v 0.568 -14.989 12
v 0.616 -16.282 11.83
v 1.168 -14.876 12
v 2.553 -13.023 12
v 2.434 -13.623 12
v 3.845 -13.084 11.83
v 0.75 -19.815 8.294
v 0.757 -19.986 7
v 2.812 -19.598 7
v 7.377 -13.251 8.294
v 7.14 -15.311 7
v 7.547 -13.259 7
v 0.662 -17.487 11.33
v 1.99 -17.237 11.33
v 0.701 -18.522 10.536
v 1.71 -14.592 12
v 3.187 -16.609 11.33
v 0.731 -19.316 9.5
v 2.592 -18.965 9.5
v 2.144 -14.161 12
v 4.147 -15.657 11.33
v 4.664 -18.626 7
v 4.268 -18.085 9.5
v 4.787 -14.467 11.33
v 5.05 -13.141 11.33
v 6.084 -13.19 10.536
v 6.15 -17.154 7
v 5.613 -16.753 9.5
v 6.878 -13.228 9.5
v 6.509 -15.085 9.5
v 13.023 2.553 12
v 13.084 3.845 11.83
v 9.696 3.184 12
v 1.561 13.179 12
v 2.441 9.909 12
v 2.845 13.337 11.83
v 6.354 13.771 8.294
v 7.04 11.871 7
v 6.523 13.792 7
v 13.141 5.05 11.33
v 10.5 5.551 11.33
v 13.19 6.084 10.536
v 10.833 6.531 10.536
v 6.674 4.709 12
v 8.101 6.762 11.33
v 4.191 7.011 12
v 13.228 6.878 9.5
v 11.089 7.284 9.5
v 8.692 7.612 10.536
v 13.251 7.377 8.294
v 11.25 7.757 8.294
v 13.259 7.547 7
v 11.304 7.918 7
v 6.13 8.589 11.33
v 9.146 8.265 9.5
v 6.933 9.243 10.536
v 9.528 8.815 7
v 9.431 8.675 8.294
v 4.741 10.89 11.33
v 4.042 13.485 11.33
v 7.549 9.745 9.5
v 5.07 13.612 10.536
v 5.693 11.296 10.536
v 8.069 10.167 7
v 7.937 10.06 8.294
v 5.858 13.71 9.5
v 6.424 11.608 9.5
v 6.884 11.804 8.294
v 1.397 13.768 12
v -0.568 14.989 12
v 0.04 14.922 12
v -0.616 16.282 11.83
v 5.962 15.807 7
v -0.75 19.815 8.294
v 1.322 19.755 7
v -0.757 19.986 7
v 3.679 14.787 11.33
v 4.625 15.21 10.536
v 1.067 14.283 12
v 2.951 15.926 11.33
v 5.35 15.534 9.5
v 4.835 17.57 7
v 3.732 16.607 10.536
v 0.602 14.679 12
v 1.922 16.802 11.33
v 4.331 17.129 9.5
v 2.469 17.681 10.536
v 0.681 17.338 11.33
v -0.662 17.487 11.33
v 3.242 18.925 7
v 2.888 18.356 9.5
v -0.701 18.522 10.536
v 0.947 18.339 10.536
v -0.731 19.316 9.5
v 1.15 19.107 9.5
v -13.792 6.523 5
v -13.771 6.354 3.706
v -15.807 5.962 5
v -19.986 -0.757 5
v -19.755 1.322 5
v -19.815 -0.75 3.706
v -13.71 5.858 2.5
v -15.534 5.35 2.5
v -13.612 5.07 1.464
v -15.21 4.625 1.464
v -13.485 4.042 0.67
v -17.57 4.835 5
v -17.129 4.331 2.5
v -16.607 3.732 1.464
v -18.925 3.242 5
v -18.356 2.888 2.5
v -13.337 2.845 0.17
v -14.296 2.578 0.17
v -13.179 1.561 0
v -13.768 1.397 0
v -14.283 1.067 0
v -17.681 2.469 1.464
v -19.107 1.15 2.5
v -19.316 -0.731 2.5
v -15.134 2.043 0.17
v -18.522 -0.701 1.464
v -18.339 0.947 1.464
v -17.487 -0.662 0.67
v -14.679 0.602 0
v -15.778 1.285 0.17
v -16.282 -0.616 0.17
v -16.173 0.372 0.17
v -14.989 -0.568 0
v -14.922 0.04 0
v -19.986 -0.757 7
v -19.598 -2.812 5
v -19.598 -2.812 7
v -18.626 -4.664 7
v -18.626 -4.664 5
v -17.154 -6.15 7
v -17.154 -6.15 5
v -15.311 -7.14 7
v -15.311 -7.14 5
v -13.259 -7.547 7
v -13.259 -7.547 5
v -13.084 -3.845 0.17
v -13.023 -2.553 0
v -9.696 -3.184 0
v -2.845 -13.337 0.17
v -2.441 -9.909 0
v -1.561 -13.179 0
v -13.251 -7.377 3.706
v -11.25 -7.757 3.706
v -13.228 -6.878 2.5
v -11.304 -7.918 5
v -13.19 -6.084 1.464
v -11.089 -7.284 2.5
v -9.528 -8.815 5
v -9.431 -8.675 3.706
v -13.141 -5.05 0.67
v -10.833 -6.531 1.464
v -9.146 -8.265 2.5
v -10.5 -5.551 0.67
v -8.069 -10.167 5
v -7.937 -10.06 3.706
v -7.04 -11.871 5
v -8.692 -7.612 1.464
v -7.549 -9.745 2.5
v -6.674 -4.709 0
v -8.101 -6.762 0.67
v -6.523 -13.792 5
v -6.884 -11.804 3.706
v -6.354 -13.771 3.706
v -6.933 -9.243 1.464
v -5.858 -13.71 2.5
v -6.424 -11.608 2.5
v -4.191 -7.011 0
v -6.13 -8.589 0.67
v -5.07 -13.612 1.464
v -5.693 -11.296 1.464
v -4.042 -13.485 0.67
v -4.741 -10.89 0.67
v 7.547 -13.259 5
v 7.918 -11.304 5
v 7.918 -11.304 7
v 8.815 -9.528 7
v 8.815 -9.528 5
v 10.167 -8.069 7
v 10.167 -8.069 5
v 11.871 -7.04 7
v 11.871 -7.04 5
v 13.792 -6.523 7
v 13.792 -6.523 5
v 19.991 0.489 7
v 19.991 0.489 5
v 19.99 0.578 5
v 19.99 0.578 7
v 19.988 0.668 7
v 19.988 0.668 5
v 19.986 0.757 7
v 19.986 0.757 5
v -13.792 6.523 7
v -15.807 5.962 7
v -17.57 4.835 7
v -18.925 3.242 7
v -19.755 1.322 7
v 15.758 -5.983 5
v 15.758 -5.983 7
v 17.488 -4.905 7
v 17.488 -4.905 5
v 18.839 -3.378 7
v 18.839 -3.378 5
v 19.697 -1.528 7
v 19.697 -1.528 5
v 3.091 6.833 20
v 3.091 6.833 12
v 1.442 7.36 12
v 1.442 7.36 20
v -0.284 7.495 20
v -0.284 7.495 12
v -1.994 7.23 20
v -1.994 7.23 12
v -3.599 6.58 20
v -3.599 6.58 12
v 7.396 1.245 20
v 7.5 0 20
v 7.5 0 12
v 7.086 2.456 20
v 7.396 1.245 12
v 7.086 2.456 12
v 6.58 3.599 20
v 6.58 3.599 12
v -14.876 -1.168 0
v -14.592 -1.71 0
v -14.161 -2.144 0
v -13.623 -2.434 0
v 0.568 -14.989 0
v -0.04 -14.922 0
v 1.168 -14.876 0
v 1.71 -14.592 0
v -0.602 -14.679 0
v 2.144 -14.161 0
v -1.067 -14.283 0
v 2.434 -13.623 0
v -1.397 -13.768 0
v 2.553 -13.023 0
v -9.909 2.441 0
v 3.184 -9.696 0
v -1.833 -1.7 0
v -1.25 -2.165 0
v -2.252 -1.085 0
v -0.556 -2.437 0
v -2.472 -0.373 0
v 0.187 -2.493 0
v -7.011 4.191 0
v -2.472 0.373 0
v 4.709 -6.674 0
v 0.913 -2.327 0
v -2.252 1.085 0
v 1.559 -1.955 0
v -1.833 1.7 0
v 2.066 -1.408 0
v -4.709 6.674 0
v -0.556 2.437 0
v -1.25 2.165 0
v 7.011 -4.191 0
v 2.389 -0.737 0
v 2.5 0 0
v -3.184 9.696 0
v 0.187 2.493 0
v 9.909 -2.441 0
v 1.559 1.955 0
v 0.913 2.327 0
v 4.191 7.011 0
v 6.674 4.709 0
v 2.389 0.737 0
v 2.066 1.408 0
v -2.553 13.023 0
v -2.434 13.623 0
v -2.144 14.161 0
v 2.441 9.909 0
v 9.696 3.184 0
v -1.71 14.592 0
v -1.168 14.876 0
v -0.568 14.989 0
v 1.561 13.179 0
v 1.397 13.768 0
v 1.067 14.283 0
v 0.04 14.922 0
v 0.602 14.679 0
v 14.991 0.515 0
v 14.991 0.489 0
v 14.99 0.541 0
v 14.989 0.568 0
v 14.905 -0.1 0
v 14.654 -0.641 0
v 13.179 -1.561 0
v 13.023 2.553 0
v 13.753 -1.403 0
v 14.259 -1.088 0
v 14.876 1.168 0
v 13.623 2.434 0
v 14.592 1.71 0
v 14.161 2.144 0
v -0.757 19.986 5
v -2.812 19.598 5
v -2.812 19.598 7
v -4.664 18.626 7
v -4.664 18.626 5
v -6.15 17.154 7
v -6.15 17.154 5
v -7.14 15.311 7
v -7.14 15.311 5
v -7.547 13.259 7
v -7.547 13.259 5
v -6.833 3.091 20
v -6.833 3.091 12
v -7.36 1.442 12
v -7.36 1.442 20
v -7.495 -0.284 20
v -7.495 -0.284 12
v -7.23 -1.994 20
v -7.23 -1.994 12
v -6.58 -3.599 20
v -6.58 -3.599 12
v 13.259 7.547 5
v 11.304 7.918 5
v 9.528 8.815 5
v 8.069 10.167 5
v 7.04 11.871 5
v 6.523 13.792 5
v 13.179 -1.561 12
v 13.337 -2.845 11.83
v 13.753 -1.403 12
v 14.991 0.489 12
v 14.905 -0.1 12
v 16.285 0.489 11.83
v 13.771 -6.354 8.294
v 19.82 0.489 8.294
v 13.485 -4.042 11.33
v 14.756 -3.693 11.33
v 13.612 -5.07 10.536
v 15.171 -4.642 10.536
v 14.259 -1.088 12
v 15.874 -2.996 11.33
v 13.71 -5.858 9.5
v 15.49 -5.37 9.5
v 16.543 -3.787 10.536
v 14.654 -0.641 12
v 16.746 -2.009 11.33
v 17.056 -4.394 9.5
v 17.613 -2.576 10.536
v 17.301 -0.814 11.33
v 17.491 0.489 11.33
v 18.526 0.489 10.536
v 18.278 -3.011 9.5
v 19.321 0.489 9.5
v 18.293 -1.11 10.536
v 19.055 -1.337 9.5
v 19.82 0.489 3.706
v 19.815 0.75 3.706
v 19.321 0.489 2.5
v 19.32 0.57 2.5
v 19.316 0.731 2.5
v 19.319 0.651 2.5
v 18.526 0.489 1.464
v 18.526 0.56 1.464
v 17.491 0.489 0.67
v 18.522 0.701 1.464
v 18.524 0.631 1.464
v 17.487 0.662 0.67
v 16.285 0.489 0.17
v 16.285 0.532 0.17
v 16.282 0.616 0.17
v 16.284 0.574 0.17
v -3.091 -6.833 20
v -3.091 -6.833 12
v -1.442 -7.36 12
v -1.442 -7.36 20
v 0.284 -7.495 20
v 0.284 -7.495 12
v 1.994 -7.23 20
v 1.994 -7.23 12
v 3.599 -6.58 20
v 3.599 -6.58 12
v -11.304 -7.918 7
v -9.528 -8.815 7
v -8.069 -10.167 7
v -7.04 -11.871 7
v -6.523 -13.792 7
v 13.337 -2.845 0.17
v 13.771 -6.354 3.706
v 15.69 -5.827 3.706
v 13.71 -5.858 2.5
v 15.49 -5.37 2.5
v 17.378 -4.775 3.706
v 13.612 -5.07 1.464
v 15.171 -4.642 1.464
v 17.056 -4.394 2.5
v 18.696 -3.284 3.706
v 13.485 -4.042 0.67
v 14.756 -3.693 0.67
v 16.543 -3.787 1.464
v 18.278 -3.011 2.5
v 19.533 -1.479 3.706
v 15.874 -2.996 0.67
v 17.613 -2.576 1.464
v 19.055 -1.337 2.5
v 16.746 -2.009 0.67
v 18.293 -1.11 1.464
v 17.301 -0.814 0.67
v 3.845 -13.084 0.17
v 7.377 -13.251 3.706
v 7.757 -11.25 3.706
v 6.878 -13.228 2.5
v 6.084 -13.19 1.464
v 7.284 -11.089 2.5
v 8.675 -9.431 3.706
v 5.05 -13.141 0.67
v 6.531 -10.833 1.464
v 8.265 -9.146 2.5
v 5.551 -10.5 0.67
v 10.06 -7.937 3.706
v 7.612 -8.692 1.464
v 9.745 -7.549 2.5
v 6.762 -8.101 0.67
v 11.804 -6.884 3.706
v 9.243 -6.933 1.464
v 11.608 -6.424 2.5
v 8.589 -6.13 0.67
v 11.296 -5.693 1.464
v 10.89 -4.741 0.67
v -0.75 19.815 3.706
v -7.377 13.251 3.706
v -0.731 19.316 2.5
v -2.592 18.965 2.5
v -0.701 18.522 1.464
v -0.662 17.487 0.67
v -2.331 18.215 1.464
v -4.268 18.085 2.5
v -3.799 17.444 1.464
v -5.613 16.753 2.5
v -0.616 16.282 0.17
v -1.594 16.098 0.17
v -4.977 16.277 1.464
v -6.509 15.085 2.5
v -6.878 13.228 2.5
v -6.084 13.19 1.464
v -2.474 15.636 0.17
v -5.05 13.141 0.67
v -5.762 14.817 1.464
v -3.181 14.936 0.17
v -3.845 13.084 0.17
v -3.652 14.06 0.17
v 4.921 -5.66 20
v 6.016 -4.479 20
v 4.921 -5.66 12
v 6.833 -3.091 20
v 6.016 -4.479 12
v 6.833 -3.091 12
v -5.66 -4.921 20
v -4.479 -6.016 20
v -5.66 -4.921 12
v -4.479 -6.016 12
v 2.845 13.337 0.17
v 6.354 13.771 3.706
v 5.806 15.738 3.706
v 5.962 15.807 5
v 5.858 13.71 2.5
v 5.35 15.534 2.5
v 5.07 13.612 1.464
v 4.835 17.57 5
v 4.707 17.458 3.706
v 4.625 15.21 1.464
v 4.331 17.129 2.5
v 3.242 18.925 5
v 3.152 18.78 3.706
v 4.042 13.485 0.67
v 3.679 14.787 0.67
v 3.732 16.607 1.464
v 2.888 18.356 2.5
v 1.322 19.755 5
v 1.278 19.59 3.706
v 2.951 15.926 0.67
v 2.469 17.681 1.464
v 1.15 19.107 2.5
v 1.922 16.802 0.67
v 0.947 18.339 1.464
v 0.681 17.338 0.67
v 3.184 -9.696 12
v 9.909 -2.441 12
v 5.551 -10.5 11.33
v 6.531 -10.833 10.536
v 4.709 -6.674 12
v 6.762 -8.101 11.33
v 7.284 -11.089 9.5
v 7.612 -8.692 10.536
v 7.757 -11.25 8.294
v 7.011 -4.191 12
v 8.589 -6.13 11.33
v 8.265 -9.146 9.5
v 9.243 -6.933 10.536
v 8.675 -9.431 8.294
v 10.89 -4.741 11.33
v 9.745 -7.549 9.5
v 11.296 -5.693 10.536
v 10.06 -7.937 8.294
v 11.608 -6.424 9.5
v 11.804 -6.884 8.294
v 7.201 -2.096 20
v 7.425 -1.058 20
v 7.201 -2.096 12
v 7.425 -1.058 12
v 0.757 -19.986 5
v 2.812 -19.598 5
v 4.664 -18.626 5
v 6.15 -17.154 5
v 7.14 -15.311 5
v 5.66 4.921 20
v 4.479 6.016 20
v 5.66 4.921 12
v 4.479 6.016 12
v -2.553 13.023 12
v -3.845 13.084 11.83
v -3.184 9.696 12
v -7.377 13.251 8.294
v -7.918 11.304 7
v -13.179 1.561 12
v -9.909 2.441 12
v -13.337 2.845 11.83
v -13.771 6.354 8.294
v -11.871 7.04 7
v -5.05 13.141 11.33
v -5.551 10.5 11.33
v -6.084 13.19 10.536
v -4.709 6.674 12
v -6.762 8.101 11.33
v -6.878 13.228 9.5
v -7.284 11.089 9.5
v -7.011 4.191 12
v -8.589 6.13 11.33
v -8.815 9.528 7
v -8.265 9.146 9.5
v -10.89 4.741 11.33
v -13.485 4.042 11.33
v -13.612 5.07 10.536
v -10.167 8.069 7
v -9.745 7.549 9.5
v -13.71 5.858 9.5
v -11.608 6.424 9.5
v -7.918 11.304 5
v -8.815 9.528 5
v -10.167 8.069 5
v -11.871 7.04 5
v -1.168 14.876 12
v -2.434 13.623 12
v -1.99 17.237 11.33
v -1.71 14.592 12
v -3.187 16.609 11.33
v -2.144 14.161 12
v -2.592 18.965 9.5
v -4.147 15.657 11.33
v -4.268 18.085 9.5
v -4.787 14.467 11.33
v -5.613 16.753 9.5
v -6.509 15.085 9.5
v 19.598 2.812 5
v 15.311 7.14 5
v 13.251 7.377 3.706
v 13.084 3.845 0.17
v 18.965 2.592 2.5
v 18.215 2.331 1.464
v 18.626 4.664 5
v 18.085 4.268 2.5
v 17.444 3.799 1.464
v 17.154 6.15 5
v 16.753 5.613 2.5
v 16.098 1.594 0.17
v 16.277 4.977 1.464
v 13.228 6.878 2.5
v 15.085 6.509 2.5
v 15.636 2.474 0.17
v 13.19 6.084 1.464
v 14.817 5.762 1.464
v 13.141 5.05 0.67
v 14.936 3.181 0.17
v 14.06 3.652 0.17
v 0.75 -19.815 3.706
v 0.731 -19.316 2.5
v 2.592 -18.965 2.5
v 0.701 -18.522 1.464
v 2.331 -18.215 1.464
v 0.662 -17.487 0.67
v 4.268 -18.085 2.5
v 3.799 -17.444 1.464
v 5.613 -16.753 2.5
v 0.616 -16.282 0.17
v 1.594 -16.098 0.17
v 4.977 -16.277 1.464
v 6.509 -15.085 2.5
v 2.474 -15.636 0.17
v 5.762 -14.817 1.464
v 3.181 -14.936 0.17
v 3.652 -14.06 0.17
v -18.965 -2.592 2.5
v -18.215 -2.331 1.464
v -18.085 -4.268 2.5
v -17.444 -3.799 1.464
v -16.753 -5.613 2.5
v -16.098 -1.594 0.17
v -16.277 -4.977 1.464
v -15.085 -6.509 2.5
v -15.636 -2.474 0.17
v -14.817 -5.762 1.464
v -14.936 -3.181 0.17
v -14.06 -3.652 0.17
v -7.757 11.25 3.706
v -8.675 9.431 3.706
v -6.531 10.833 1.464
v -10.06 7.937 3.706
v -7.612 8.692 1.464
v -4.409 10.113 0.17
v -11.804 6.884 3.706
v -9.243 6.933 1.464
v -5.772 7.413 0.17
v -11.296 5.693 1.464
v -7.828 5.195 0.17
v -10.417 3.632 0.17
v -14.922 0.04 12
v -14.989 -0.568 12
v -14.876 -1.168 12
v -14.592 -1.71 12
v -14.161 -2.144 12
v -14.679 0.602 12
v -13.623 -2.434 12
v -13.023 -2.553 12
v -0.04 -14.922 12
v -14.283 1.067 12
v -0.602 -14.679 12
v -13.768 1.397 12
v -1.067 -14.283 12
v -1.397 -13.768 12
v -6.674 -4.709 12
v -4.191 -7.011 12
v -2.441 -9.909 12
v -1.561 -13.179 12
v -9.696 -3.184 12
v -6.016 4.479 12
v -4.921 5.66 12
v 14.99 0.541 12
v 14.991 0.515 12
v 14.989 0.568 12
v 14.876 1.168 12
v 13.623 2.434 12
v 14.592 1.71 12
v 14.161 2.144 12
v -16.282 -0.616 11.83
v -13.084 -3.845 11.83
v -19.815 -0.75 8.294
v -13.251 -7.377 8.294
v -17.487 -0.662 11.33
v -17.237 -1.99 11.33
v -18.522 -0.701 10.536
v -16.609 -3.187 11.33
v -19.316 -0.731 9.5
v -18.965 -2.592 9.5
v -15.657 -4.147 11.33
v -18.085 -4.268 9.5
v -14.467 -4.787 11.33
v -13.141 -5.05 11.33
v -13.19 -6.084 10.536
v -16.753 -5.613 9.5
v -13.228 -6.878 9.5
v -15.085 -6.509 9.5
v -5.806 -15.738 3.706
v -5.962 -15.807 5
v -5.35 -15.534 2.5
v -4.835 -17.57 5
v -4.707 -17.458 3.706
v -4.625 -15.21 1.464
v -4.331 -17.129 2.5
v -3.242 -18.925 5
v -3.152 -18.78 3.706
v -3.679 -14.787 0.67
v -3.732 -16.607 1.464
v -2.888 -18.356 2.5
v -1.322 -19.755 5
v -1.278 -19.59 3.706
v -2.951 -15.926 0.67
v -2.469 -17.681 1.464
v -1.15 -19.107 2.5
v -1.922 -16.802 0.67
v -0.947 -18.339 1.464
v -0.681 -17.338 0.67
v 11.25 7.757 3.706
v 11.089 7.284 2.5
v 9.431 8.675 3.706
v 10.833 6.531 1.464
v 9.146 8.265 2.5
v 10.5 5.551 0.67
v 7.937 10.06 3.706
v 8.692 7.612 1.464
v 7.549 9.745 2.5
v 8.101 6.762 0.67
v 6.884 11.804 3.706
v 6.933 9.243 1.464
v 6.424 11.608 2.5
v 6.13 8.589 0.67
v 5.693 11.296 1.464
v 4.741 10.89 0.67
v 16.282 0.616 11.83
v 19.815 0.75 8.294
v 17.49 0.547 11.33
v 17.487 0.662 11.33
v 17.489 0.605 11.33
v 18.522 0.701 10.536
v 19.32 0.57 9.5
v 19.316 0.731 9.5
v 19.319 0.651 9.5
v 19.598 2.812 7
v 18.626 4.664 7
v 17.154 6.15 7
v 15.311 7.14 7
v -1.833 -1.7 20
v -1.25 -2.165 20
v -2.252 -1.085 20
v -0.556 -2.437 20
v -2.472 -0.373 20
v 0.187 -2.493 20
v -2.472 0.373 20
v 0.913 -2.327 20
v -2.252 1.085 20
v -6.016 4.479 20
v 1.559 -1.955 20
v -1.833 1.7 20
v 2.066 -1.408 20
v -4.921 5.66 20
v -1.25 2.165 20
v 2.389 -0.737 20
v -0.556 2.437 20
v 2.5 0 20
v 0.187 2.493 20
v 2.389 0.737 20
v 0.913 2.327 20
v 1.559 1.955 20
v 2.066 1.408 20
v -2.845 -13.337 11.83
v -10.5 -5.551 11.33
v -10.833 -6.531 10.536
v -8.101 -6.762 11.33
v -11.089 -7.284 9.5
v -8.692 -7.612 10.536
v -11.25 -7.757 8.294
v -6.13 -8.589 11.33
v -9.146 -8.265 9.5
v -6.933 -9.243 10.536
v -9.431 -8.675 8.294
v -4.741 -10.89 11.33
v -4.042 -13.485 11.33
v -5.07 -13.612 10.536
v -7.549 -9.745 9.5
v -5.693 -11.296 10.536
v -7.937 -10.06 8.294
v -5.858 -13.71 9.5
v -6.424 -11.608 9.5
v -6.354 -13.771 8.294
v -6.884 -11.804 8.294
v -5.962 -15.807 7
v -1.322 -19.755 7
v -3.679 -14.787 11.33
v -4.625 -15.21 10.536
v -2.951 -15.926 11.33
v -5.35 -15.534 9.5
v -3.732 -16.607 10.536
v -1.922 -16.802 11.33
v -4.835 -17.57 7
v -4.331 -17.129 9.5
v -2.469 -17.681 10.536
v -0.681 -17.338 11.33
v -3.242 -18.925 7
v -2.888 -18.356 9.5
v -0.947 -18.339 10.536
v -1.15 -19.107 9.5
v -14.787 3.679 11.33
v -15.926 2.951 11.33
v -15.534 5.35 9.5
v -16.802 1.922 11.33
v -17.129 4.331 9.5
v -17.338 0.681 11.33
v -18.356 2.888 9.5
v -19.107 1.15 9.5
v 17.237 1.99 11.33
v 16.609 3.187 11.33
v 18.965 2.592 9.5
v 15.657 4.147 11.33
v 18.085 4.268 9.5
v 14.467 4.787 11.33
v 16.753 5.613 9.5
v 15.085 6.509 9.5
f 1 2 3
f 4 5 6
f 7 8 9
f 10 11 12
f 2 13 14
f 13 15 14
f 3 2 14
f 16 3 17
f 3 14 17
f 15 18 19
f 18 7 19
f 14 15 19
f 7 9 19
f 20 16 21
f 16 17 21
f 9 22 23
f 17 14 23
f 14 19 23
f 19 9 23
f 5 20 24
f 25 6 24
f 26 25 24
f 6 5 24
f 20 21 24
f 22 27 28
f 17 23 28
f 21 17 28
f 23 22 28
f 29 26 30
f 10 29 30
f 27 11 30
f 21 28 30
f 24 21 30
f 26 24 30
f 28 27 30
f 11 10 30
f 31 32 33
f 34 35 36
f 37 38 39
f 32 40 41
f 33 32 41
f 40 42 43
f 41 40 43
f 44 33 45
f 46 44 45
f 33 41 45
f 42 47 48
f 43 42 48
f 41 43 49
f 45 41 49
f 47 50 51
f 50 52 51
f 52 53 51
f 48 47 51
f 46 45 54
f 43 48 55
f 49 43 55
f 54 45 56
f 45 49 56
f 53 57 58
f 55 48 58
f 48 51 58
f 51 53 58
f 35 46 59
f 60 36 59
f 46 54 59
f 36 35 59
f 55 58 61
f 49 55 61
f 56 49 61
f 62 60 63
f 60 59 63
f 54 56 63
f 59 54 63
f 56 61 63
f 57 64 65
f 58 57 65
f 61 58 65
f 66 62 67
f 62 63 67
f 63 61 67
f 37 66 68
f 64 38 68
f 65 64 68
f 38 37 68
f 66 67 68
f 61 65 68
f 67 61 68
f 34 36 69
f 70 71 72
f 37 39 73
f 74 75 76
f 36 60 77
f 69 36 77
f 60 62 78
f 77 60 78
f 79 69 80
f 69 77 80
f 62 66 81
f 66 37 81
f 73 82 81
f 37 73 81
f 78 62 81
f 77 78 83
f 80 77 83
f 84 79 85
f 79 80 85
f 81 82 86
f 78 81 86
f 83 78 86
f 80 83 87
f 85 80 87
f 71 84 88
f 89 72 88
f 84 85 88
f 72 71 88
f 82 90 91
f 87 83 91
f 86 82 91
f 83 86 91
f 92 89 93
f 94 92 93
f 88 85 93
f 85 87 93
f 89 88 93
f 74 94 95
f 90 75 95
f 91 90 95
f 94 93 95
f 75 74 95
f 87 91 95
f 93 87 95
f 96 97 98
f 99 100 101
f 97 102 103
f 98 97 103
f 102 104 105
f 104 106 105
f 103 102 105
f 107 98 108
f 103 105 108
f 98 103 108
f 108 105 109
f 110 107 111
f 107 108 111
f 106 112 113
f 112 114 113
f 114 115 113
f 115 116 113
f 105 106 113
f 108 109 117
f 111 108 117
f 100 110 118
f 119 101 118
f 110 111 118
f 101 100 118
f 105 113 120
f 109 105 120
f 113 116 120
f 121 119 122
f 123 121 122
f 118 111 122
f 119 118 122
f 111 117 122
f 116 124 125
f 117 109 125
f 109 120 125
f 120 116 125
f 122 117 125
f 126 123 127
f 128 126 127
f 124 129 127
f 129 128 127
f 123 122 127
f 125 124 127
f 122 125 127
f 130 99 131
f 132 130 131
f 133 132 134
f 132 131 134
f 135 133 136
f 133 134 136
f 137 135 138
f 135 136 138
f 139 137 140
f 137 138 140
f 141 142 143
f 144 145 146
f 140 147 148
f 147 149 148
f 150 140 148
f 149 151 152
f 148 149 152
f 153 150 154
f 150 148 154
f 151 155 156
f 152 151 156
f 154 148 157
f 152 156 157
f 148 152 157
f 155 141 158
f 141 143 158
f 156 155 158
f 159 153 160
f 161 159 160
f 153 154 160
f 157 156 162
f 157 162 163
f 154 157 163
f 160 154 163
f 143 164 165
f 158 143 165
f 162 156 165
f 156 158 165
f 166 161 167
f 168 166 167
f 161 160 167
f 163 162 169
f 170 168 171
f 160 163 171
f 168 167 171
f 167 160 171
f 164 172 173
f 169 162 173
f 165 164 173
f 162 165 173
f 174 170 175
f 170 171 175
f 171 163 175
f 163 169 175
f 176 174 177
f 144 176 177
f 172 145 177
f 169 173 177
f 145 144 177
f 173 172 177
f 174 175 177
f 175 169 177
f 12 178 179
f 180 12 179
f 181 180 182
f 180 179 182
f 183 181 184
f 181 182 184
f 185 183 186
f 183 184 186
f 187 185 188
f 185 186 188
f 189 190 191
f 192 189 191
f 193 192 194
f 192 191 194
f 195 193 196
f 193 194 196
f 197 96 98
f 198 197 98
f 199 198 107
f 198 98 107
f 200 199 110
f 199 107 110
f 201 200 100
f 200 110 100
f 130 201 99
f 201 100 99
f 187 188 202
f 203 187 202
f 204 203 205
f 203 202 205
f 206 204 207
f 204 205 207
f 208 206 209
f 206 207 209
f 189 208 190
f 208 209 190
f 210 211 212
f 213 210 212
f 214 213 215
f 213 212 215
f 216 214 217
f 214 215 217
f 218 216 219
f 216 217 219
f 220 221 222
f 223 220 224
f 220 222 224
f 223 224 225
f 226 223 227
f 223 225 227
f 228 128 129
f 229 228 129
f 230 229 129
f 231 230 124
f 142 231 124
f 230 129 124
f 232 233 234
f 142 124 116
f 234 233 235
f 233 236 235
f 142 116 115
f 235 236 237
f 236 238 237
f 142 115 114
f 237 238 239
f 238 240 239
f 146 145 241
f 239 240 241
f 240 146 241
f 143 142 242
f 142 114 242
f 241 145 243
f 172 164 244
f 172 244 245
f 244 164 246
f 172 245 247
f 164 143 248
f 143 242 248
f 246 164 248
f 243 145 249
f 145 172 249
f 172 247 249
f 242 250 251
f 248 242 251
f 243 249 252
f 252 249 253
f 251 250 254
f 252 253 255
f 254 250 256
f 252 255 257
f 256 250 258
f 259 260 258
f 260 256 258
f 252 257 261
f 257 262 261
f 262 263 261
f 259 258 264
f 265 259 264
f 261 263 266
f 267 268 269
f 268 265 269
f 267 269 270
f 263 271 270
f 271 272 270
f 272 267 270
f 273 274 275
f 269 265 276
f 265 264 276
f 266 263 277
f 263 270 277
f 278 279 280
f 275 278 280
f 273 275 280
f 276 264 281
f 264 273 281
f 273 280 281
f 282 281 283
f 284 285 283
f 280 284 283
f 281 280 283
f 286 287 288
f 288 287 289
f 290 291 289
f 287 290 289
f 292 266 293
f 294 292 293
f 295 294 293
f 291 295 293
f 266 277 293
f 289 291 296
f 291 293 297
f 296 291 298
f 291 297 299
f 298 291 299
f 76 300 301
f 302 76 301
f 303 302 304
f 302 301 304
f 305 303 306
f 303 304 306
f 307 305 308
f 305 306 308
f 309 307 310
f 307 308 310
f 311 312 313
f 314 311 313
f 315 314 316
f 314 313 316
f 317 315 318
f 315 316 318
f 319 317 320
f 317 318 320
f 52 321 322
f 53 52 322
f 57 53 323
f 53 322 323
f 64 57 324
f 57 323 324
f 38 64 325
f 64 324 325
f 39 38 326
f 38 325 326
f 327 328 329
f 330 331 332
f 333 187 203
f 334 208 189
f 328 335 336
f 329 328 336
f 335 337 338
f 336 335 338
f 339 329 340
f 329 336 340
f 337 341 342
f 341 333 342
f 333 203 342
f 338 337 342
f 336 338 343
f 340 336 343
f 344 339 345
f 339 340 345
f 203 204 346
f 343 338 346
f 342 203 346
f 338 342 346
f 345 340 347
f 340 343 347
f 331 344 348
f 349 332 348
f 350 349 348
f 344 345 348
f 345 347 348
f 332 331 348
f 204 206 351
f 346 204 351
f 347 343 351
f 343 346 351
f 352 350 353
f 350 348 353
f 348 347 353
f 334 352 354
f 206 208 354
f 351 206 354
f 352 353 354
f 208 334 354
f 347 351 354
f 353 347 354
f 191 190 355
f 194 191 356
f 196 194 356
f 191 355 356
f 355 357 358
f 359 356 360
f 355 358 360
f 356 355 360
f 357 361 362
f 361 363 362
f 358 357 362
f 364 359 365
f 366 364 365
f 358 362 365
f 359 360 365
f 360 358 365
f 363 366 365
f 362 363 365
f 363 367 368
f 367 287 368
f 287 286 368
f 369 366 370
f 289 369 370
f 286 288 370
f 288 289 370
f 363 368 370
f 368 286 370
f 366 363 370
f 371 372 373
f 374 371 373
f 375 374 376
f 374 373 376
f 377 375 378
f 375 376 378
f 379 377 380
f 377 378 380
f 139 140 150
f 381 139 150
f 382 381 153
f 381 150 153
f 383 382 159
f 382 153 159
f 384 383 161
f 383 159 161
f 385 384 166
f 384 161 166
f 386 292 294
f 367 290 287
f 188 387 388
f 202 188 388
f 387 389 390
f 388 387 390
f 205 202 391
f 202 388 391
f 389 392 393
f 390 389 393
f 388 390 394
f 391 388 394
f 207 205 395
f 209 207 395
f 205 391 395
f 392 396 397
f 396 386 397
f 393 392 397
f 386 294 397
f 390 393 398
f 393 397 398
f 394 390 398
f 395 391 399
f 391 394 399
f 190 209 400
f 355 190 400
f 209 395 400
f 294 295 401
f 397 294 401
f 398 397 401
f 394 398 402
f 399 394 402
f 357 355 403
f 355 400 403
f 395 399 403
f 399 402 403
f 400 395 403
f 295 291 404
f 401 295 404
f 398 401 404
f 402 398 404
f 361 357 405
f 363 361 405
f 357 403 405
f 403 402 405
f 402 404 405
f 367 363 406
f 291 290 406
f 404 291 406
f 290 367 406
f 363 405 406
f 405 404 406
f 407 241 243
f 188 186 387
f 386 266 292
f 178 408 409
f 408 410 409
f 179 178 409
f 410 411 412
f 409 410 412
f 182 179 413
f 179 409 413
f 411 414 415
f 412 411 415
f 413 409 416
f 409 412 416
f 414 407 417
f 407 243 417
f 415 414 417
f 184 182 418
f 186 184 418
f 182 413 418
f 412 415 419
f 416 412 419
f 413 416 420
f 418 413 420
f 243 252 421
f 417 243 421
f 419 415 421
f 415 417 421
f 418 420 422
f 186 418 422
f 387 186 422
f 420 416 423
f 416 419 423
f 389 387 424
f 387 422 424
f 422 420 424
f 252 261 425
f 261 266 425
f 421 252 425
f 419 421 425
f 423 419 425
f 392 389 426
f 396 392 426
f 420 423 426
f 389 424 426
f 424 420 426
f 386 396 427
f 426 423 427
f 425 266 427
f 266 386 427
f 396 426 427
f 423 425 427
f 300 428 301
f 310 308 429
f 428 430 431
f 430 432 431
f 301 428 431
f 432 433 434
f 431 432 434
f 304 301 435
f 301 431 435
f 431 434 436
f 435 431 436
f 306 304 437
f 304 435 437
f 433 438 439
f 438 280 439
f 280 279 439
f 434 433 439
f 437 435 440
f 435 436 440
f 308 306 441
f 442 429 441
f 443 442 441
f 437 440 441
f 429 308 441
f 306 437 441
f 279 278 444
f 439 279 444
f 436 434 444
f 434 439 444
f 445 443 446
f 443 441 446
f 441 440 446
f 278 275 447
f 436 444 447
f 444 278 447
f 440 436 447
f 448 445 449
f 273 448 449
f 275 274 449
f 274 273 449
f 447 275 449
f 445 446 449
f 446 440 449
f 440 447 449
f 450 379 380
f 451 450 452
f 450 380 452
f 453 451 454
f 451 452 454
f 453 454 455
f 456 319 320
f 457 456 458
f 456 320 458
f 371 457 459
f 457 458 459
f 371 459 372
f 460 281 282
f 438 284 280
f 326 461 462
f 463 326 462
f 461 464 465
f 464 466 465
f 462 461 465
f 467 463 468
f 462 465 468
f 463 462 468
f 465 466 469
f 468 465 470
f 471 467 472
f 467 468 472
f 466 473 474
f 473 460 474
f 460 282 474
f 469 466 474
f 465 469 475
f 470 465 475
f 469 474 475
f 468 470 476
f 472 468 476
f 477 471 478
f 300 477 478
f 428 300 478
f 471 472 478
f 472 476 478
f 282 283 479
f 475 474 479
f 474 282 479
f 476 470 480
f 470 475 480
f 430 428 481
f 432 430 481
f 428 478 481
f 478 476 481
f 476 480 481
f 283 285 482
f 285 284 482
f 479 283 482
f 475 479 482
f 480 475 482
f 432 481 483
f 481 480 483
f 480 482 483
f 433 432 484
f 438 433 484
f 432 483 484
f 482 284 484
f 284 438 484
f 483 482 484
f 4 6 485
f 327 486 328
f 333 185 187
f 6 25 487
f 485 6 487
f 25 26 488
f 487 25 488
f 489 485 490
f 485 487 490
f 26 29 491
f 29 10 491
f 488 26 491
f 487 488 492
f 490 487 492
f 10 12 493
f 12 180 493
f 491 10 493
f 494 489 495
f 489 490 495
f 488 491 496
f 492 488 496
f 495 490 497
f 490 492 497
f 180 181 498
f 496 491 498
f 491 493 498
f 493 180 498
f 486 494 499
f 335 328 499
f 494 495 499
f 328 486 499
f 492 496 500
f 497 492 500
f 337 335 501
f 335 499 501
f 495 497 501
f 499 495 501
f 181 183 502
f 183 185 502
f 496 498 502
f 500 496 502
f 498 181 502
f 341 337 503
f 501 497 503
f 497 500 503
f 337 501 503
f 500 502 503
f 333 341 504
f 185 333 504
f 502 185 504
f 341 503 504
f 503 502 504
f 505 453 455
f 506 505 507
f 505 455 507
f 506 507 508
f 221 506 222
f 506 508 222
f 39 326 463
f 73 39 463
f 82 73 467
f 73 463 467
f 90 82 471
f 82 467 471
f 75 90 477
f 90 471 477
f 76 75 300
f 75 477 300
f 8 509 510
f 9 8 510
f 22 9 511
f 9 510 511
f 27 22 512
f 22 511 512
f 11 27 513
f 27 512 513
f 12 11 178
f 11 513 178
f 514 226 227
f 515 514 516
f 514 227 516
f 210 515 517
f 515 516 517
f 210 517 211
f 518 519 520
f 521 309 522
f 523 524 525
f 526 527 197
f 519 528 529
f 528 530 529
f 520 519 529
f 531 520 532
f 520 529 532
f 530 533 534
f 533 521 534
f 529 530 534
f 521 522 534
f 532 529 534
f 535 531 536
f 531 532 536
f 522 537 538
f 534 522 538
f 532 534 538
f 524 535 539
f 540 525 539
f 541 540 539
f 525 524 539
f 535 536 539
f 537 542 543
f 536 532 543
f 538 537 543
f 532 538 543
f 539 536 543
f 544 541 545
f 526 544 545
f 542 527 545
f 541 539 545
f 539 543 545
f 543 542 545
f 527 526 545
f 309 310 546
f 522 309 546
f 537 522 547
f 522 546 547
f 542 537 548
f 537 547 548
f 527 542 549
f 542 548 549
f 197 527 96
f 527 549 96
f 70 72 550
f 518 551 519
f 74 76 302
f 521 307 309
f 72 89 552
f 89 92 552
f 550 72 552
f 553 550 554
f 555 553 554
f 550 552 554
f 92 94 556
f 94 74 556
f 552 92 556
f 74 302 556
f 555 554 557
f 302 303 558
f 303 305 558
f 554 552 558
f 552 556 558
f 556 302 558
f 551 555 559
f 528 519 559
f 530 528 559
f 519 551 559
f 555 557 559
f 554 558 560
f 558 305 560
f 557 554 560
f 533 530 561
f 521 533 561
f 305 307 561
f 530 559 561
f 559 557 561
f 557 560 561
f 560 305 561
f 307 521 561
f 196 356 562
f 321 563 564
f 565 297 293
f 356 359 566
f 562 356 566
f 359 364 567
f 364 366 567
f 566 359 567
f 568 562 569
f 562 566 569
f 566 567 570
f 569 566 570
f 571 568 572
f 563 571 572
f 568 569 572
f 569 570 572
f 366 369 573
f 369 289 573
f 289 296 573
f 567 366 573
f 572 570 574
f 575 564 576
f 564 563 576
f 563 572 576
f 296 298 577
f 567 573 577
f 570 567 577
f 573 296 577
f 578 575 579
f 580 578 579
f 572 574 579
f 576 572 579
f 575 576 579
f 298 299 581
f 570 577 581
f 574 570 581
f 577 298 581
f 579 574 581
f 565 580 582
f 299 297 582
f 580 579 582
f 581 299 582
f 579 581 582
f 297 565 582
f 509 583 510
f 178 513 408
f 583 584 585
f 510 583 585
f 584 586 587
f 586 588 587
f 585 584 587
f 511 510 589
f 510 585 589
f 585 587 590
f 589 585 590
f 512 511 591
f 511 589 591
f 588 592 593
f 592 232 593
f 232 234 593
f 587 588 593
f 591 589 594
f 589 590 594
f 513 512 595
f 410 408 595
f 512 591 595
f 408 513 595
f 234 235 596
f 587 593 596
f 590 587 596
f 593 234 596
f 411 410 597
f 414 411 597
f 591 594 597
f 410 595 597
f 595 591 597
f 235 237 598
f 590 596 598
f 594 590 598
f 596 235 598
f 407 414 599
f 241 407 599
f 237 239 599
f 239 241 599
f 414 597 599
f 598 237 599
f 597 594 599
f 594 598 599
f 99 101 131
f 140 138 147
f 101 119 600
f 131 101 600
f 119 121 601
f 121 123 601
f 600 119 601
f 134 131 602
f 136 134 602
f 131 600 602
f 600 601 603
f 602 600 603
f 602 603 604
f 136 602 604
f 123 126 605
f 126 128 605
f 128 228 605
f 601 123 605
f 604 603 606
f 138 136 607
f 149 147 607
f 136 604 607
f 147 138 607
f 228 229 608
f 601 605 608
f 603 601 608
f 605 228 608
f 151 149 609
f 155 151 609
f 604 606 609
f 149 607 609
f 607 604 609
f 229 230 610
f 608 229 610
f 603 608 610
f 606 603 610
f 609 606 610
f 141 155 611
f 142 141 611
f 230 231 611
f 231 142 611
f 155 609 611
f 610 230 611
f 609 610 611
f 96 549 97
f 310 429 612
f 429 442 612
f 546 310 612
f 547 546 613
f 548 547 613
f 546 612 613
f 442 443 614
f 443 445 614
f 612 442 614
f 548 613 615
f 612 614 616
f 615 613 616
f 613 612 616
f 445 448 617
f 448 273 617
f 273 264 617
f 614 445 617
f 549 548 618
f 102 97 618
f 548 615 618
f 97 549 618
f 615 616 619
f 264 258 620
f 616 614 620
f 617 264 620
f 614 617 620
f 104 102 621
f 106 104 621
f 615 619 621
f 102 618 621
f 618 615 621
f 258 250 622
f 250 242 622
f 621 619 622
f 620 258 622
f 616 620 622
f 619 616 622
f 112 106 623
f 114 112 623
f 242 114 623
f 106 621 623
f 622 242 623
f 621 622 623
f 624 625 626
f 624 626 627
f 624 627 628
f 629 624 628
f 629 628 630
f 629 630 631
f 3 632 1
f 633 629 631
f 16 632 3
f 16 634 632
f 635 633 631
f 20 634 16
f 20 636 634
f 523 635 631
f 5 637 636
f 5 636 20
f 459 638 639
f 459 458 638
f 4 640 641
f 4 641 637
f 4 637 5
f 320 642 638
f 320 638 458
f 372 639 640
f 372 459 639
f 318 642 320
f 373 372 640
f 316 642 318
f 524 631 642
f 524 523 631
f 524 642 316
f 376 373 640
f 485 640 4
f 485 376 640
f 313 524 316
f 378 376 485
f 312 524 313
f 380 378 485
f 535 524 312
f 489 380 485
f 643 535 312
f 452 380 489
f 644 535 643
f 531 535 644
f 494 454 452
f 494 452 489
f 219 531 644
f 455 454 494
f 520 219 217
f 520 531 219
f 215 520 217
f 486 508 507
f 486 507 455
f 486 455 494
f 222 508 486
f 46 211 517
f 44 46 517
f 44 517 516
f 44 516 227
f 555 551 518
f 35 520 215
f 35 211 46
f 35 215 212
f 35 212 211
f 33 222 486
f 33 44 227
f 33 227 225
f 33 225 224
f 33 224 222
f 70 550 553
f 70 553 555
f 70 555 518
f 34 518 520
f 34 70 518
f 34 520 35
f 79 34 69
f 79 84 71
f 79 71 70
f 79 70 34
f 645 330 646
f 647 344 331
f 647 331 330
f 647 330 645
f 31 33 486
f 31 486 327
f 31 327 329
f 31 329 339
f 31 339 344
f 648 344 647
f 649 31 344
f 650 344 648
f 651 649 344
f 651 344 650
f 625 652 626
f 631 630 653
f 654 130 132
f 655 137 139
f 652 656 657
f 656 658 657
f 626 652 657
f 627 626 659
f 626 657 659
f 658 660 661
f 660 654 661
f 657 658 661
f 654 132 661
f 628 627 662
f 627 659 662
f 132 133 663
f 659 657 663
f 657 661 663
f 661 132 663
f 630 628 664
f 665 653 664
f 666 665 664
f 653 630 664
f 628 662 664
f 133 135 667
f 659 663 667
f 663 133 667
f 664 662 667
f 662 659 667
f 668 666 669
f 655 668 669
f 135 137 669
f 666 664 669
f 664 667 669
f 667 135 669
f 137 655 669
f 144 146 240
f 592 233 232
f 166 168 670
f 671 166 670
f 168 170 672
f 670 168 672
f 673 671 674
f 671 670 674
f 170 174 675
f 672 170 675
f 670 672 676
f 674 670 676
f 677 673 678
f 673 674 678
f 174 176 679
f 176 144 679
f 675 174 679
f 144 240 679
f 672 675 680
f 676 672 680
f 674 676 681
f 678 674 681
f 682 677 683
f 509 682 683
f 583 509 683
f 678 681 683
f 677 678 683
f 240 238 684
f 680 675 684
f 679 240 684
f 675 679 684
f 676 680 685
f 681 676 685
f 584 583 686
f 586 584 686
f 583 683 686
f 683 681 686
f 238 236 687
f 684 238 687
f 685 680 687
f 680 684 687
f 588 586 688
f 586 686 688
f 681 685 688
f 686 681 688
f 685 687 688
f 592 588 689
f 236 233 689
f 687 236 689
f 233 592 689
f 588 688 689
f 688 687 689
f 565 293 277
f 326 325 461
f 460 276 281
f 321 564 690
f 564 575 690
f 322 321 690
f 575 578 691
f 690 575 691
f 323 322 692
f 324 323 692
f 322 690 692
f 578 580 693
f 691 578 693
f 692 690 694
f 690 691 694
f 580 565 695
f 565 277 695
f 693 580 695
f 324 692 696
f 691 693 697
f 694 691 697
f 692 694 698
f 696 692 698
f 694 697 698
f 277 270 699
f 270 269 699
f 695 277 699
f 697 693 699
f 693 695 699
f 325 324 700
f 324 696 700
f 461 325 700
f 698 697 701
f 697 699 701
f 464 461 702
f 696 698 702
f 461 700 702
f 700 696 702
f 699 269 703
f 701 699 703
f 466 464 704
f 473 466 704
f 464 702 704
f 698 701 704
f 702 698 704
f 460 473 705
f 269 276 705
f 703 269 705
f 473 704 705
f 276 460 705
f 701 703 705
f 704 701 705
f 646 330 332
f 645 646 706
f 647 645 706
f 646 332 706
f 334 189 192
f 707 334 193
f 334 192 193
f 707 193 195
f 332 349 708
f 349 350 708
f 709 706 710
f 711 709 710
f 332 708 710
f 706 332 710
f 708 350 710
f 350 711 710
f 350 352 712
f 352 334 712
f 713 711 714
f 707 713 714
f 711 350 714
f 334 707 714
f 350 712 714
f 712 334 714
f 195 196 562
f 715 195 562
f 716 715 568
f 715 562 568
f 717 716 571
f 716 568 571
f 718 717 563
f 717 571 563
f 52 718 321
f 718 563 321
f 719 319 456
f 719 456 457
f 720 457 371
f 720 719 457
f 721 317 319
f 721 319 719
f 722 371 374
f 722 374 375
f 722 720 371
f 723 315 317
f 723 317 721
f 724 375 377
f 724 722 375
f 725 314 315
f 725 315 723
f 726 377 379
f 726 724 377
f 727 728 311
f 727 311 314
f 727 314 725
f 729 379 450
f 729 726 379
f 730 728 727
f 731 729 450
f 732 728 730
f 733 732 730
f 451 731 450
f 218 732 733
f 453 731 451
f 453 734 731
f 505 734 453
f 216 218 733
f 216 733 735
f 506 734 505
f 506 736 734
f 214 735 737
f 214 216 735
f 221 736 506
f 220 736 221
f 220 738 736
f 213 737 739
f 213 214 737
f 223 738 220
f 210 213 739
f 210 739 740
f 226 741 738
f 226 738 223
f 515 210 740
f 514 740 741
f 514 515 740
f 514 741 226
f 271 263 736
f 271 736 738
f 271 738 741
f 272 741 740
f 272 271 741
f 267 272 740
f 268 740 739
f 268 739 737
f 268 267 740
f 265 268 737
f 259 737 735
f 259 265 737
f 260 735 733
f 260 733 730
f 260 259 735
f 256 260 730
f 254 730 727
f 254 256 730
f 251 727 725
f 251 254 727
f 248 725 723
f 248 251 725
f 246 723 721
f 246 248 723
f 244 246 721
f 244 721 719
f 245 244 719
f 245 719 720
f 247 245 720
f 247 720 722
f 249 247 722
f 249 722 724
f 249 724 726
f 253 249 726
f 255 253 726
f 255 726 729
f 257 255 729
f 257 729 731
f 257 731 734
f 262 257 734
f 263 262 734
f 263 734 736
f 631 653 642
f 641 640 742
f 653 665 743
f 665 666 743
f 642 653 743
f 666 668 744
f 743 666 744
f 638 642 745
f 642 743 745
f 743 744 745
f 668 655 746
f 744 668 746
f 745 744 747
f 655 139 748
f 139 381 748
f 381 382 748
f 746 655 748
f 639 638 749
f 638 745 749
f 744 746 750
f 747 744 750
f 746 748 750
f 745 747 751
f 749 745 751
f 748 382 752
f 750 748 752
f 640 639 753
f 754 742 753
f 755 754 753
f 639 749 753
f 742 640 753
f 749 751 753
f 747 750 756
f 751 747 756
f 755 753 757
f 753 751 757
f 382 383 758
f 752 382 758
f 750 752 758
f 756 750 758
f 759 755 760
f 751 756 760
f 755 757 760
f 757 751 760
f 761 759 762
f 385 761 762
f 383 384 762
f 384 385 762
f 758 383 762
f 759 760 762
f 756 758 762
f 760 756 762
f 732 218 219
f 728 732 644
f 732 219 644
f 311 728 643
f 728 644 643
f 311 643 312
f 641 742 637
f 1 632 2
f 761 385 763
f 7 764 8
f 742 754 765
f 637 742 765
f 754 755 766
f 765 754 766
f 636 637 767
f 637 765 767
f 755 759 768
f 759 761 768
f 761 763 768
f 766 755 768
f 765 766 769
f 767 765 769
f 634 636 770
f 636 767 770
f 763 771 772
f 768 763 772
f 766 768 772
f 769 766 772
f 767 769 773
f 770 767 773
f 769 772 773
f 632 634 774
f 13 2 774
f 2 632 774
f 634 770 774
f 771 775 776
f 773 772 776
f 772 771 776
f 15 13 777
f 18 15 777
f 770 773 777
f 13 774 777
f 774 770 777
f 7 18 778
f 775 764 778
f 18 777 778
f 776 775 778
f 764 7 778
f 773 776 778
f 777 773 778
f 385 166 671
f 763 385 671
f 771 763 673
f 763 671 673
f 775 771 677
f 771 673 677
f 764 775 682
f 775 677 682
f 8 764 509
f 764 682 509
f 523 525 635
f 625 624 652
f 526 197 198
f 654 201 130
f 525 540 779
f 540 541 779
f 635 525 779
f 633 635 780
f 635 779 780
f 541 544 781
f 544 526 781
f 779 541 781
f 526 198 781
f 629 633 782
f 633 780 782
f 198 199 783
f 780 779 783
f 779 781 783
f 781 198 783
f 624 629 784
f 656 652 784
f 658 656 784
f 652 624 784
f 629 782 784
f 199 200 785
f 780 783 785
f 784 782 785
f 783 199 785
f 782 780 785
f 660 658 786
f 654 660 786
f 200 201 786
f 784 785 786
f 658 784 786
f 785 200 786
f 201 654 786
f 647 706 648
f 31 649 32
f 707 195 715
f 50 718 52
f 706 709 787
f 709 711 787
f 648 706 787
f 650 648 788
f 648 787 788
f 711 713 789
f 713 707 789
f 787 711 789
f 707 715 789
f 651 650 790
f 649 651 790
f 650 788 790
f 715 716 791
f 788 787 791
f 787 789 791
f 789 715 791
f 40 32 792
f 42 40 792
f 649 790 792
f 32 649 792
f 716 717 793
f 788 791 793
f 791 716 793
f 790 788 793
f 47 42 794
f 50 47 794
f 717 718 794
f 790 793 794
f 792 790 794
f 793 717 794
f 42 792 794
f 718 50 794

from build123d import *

# Parameters (mm, degrees)
F0_R     = 2.5
F1_DEPTH = 20
F2_DEPTH = 12
F3_R     = 5


with BuildPart() as f1:
    # F0 (on Top) → F1 (new body)
    with BuildSketch(Plane.XY):
        with BuildLine():
            ThreePointArc((6.8334705864, -3.0909027395), (5.8642916103, 0.2220330494), (6.5801871048, 3.5987689097))
            ThreePointArc((6.5801871048, 3.5987689097), (5.0988546193, 5.500152868), (3.0909027395, 6.8334705864))
            ThreePointArc((3.0909027395, 6.8334705864), (-0.2220330494, 5.8642916103), (-3.5987689097, 6.5801871048))
            ThreePointArc((-3.5987689097, 6.5801871048), (-5.500152868, 5.0988546193), (-6.8334705864, 3.0909027395))
            ThreePointArc((-6.8334705864, 3.0909027395), (-6.1071411443, 1.3658616264), (-5.8592325951, -0.489364142))
            ThreePointArc((-5.8592325951, -0.489364142), (-6.0418306344, -2.0853100539), (-6.5801871048, -3.5987689097))
            ThreePointArc((-6.5801871048, -3.5987689097), (-5.0988546193, -5.500152868), (-3.0909027395, -6.8334705864))
            ThreePointArc((-3.0909027395, -6.8334705864), (0.2220330494, -5.8642916103), (3.5987689097, -6.5801871048))
            ThreePointArc((3.5987689097, -6.5801871048), (5.500152868, -5.0988546193), (6.8334705864, -3.0909027395))
        make_face()
        Circle(F0_R, mode=Mode.SUBTRACT)
        with BuildLine():
            ThreePointArc((-3.5987689097, 6.5801871048), (-0.2220330494, 5.8642916103), (3.0909027395, 6.8334705864))
            ThreePointArc((3.0909027395, 6.8334705864), (-0.283760713, 7.4946300681), (-3.5987689097, 6.5801871048))
        make_face()
        with BuildLine():
            ThreePointArc((6.8334705864, -3.0909027395), (7.3314742514, -1.5809760596), (7.5, 0))
            ThreePointArc((7.5, 0), (7.2664091299, 1.8572286765), (6.5801871048, 3.5987689097))
            ThreePointArc((6.5801871048, 3.5987689097), (5.8642916103, 0.2220330494), (6.8334705864, -3.0909027395))
        make_face()
        with BuildLine():
            ThreePointArc((-3.0909027395, -6.8334705864), (0.283760713, -7.4946300681), (3.5987689097, -6.5801871048))
            ThreePointArc((3.5987689097, -6.5801871048), (0.2220330494, -5.8642916103), (-3.0909027395, -6.8334705864))
        make_face()
        with BuildLine():
            ThreePointArc((-5.8592325951, -0.489364142), (-6.1071411443, 1.3658616264), (-6.8334705864, 3.0909027395))
            ThreePointArc((-6.8334705864, 3.0909027395), (-7.4946300681, -0.283760713), (-6.5801871048, -3.5987689097))
            ThreePointArc((-6.5801871048, -3.5987689097), (-6.0418306344, -2.0853100539), (-5.8592325951, -0.489364142))
        make_face()
    extrude(amount=F1_DEPTH)

    # F0 (on Top) → F2 (join)
    with BuildSketch(Plane.XY):
        with BuildLine():
            ThreePointArc((-6.5229662777, -13.7922181567), (-5.8475768655, -9.7995981798), (-3.0909027395, -6.8334705864))
            ThreePointArc((-3.0909027395, -6.8334705864), (-5.0988546193, -5.500152868), (-6.5801871048, -3.5987689097))
            ThreePointArc((-6.5801871048, -3.5987689097), (-9.3293758522, -6.5718355247), (-13.2594952145, -7.5471947736))
            ThreePointArc((-13.2594952145, -7.5471947736), (-8.751081206, -9.4398231008), (-6.5229662777, -13.7922181567))
        make_face()
        with BuildLine():
            ThreePointArc((6.5801871048, 3.5987689097), (7.2664091299, 1.8572286765), (7.5, 0))
            ThreePointArc((7.5, 0), (7.3314742514, -1.5809760596), (6.8334705864, -3.0909027395))
            ThreePointArc((6.8334705864, -3.0909027395), (9.7995980718, -5.8475768122), (13.7922179176, -6.5229663073))
            ThreePointArc((13.7922179176, -6.5229663073), (18.2189691424, -4.1902310429), (19.9907391968, 0.489364142))
            ThreePointArc((19.9907391968, 0.489364142), (19.9894743232, 0.6230539717), (19.985680155, 0.7566959365))
            ThreePointArc((19.985680155, 0.7566959365), (17.9449438052, 5.4617772682), (13.2594951602, 7.5471947762))
            ThreePointArc((13.2594951602, 7.5471947762), (9.3293758288, 6.5718355109), (6.5801871048, 3.5987689097))
        make_face()
        with BuildLine():
            ThreePointArc((13.7922179176, -6.5229663073), (9.7995980718, -5.8475768122), (6.8334705864, -3.0909027395))
            ThreePointArc((6.8334705864, -3.0909027395), (5.500152868, -5.0988546193), (3.5987689097, -6.5801871048))
            ThreePointArc((3.5987689097, -6.5801871048), (6.4849940801, -9.1863643112), (7.5551174429, -12.9249858959))
            ThreePointArc((7.5551174429, -12.9249858959), (7.5531364952, -13.0922875721), (7.547194763, -13.2594954392))
            ThreePointArc((7.547194763, -13.2594954392), (9.4398229424, -8.7510813768), (13.7922179176, -6.5229663073))
        make_face()
        with BuildLine():
            ThreePointArc((6.8334705864, -3.0909027395), (5.8642916103, 0.2220330494), (6.5801871048, 3.5987689097))
            ThreePointArc((6.5801871048, 3.5987689097), (5.0988546193, 5.500152868), (3.0909027395, 6.8334705864))
            ThreePointArc((3.0909027395, 6.8334705864), (-0.2220330494, 5.8642916103), (-3.5987689097, 6.5801871048))
            ThreePointArc((-3.5987689097, 6.5801871048), (-5.500152868, 5.0988546193), (-6.8334705864, 3.0909027395))
            ThreePointArc((-6.8334705864, 3.0909027395), (-6.1071411443, 1.3658616264), (-5.8592325951, -0.489364142))
            ThreePointArc((-5.8592325951, -0.489364142), (-6.0418306344, -2.0853100539), (-6.5801871048, -3.5987689097))
            ThreePointArc((-6.5801871048, -3.5987689097), (-5.0988546193, -5.500152868), (-3.0909027395, -6.8334705864))
            ThreePointArc((-3.0909027395, -6.8334705864), (0.2220330494, -5.8642916103), (3.5987689097, -6.5801871048))
            ThreePointArc((3.5987689097, -6.5801871048), (5.500152868, -5.0988546193), (6.8334705864, -3.0909027395))
        make_face()
        Circle(F0_R, mode=Mode.SUBTRACT)
        with BuildLine():
            ThreePointArc((6.8334705864, -3.0909027395), (7.3314742514, -1.5809760596), (7.5, 0))
            ThreePointArc((7.5, 0), (7.2664091299, 1.8572286765), (6.5801871048, 3.5987689097))
            ThreePointArc((6.5801871048, 3.5987689097), (5.8642916103, 0.2220330494), (6.8334705864, -3.0909027395))
        make_face()
        with BuildLine():
            ThreePointArc((7.5551174429, -12.9249858959), (6.4849940801, -9.1863643112), (3.5987689097, -6.5801871048))
            ThreePointArc((3.5987689097, -6.5801871048), (0.283760713, -7.4946300681), (-3.0909027395, -6.8334705864))
            ThreePointArc((-3.0909027395, -6.8334705864), (-5.8475768655, -9.7995981798), (-6.5229662777, -13.7922181567))
            ThreePointArc((-6.5229662777, -13.7922181567), (-4.0892275286, -18.3065626187), (0.7566938759, -19.9856802331))
            ThreePointArc((0.7566938759, -19.9856802331), (5.4617764365, -17.9449446291), (7.547194763, -13.2594954392))
            ThreePointArc((7.547194763, -13.2594954392), (7.5531364952, -13.0922875721), (7.5551174429, -12.9249858959))
        make_face()
        with BuildLine():
            ThreePointArc((3.0909027395, 6.8334705864), (5.0988546193, 5.500152868), (6.5801871048, 3.5987689097))
            ThreePointArc((6.5801871048, 3.5987689097), (9.3293758288, 6.5718355109), (13.2594951602, 7.5471947762))
            ThreePointArc((13.2594951602, 7.5471947762), (8.7510812527, 9.4398230574), (6.5229663, 13.7922179762))
            ThreePointArc((6.5229663, 13.7922179762), (6.5630207977, 13.3594238901), (6.5763891589, 12.9249858959))
            ThreePointArc((6.5763891589, 12.9249858959), (5.6434228364, 9.4158843604), (3.0909027395, 6.8334705864))
        make_face()
        with BuildLine():
            ThreePointArc((-3.5987689097, 6.5801871048), (-0.283760713, 7.4946300681), (3.0909027395, 6.8334705864))
            ThreePointArc((3.0909027395, 6.8334705864), (5.6434228364, 9.4158843604), (6.5763891589, 12.9249858959))
            ThreePointArc((6.5763891589, 12.9249858959), (6.5630207977, 13.3594238901), (6.5229663, 13.7922179762))
            ThreePointArc((6.5229663, 13.7922179762), (4.0892269422, 18.3065631176), (-0.7566955961, 19.9856801679))
            ThreePointArc((-0.7566955961, 19.9856801679), (-5.4617770309, 17.9449440403), (-7.5471947607, 13.2594954872))
            ThreePointArc((-7.5471947607, 13.2594954872), (-6.5718355942, 9.3293759697), (-3.5987689097, 6.5801871048))
        make_face()
        with BuildLine():
            ThreePointArc((-6.8334705864, 3.0909027395), (-5.500152868, 5.0988546193), (-3.5987689097, 6.5801871048))
            ThreePointArc((-3.5987689097, 6.5801871048), (-6.5718355942, 9.3293759697), (-7.5471947607, 13.2594954872))
            ThreePointArc((-7.5471947607, 13.2594954872), (-9.4398229383, 8.7510813813), (-13.7922179532, 6.5229663029))
            ThreePointArc((-13.7922179532, 6.5229663029), (-9.7995980879, 5.8475768202), (-6.8334705864, 3.0909027395))
        make_face()
        with BuildLine():
            ThreePointArc((-6.5801871048, -3.5987689097), (-7.4946300681, -0.283760713), (-6.8334705864, 3.0909027395))
            ThreePointArc((-6.8334705864, 3.0909027395), (-9.7995980879, 5.8475768202), (-13.7922179532, 6.5229663029))
            ThreePointArc((-13.7922179532, 6.5229663029), (-18.3065631087, 4.0892269526), (-19.9856801681, -0.756695592))
            ThreePointArc((-19.9856801681, -0.756695592), (-17.9449439456, -5.4617771265), (-13.2594952145, -7.5471947736))
            ThreePointArc((-13.2594952145, -7.5471947736), (-9.3293758522, -6.5718355247), (-6.5801871048, -3.5987689097))
        make_face()
        with BuildLine():
            ThreePointArc((-5.8592325951, -0.489364142), (-6.1071411443, 1.3658616264), (-6.8334705864, 3.0909027395))
            ThreePointArc((-6.8334705864, 3.0909027395), (-7.4946300681, -0.283760713), (-6.5801871048, -3.5987689097))
            ThreePointArc((-6.5801871048, -3.5987689097), (-6.0418306344, -2.0853100539), (-5.8592325951, -0.489364142))
        make_face()
        with BuildLine():
            ThreePointArc((-3.0909027395, -6.8334705864), (0.283760713, -7.4946300681), (3.5987689097, -6.5801871048))
            ThreePointArc((3.5987689097, -6.5801871048), (0.2220330494, -5.8642916103), (-3.0909027395, -6.8334705864))
        make_face()
        with BuildLine():
            ThreePointArc((-3.5987689097, 6.5801871048), (-0.2220330494, 5.8642916103), (3.0909027395, 6.8334705864))
            ThreePointArc((3.0909027395, 6.8334705864), (-0.283760713, 7.4946300681), (-3.5987689097, 6.5801871048))
        make_face()
    extrude(amount=F2_DEPTH)

    # F3
    f3_edges = [f1.edges().sort_by_distance(p)[0] for p in [
        (-19.98568, -0.756695, 12),
        (-19.98568, -0.756695, 0),
    ]]
    fillet(f3_edges, radius=F3_R)


solid = f1.part
